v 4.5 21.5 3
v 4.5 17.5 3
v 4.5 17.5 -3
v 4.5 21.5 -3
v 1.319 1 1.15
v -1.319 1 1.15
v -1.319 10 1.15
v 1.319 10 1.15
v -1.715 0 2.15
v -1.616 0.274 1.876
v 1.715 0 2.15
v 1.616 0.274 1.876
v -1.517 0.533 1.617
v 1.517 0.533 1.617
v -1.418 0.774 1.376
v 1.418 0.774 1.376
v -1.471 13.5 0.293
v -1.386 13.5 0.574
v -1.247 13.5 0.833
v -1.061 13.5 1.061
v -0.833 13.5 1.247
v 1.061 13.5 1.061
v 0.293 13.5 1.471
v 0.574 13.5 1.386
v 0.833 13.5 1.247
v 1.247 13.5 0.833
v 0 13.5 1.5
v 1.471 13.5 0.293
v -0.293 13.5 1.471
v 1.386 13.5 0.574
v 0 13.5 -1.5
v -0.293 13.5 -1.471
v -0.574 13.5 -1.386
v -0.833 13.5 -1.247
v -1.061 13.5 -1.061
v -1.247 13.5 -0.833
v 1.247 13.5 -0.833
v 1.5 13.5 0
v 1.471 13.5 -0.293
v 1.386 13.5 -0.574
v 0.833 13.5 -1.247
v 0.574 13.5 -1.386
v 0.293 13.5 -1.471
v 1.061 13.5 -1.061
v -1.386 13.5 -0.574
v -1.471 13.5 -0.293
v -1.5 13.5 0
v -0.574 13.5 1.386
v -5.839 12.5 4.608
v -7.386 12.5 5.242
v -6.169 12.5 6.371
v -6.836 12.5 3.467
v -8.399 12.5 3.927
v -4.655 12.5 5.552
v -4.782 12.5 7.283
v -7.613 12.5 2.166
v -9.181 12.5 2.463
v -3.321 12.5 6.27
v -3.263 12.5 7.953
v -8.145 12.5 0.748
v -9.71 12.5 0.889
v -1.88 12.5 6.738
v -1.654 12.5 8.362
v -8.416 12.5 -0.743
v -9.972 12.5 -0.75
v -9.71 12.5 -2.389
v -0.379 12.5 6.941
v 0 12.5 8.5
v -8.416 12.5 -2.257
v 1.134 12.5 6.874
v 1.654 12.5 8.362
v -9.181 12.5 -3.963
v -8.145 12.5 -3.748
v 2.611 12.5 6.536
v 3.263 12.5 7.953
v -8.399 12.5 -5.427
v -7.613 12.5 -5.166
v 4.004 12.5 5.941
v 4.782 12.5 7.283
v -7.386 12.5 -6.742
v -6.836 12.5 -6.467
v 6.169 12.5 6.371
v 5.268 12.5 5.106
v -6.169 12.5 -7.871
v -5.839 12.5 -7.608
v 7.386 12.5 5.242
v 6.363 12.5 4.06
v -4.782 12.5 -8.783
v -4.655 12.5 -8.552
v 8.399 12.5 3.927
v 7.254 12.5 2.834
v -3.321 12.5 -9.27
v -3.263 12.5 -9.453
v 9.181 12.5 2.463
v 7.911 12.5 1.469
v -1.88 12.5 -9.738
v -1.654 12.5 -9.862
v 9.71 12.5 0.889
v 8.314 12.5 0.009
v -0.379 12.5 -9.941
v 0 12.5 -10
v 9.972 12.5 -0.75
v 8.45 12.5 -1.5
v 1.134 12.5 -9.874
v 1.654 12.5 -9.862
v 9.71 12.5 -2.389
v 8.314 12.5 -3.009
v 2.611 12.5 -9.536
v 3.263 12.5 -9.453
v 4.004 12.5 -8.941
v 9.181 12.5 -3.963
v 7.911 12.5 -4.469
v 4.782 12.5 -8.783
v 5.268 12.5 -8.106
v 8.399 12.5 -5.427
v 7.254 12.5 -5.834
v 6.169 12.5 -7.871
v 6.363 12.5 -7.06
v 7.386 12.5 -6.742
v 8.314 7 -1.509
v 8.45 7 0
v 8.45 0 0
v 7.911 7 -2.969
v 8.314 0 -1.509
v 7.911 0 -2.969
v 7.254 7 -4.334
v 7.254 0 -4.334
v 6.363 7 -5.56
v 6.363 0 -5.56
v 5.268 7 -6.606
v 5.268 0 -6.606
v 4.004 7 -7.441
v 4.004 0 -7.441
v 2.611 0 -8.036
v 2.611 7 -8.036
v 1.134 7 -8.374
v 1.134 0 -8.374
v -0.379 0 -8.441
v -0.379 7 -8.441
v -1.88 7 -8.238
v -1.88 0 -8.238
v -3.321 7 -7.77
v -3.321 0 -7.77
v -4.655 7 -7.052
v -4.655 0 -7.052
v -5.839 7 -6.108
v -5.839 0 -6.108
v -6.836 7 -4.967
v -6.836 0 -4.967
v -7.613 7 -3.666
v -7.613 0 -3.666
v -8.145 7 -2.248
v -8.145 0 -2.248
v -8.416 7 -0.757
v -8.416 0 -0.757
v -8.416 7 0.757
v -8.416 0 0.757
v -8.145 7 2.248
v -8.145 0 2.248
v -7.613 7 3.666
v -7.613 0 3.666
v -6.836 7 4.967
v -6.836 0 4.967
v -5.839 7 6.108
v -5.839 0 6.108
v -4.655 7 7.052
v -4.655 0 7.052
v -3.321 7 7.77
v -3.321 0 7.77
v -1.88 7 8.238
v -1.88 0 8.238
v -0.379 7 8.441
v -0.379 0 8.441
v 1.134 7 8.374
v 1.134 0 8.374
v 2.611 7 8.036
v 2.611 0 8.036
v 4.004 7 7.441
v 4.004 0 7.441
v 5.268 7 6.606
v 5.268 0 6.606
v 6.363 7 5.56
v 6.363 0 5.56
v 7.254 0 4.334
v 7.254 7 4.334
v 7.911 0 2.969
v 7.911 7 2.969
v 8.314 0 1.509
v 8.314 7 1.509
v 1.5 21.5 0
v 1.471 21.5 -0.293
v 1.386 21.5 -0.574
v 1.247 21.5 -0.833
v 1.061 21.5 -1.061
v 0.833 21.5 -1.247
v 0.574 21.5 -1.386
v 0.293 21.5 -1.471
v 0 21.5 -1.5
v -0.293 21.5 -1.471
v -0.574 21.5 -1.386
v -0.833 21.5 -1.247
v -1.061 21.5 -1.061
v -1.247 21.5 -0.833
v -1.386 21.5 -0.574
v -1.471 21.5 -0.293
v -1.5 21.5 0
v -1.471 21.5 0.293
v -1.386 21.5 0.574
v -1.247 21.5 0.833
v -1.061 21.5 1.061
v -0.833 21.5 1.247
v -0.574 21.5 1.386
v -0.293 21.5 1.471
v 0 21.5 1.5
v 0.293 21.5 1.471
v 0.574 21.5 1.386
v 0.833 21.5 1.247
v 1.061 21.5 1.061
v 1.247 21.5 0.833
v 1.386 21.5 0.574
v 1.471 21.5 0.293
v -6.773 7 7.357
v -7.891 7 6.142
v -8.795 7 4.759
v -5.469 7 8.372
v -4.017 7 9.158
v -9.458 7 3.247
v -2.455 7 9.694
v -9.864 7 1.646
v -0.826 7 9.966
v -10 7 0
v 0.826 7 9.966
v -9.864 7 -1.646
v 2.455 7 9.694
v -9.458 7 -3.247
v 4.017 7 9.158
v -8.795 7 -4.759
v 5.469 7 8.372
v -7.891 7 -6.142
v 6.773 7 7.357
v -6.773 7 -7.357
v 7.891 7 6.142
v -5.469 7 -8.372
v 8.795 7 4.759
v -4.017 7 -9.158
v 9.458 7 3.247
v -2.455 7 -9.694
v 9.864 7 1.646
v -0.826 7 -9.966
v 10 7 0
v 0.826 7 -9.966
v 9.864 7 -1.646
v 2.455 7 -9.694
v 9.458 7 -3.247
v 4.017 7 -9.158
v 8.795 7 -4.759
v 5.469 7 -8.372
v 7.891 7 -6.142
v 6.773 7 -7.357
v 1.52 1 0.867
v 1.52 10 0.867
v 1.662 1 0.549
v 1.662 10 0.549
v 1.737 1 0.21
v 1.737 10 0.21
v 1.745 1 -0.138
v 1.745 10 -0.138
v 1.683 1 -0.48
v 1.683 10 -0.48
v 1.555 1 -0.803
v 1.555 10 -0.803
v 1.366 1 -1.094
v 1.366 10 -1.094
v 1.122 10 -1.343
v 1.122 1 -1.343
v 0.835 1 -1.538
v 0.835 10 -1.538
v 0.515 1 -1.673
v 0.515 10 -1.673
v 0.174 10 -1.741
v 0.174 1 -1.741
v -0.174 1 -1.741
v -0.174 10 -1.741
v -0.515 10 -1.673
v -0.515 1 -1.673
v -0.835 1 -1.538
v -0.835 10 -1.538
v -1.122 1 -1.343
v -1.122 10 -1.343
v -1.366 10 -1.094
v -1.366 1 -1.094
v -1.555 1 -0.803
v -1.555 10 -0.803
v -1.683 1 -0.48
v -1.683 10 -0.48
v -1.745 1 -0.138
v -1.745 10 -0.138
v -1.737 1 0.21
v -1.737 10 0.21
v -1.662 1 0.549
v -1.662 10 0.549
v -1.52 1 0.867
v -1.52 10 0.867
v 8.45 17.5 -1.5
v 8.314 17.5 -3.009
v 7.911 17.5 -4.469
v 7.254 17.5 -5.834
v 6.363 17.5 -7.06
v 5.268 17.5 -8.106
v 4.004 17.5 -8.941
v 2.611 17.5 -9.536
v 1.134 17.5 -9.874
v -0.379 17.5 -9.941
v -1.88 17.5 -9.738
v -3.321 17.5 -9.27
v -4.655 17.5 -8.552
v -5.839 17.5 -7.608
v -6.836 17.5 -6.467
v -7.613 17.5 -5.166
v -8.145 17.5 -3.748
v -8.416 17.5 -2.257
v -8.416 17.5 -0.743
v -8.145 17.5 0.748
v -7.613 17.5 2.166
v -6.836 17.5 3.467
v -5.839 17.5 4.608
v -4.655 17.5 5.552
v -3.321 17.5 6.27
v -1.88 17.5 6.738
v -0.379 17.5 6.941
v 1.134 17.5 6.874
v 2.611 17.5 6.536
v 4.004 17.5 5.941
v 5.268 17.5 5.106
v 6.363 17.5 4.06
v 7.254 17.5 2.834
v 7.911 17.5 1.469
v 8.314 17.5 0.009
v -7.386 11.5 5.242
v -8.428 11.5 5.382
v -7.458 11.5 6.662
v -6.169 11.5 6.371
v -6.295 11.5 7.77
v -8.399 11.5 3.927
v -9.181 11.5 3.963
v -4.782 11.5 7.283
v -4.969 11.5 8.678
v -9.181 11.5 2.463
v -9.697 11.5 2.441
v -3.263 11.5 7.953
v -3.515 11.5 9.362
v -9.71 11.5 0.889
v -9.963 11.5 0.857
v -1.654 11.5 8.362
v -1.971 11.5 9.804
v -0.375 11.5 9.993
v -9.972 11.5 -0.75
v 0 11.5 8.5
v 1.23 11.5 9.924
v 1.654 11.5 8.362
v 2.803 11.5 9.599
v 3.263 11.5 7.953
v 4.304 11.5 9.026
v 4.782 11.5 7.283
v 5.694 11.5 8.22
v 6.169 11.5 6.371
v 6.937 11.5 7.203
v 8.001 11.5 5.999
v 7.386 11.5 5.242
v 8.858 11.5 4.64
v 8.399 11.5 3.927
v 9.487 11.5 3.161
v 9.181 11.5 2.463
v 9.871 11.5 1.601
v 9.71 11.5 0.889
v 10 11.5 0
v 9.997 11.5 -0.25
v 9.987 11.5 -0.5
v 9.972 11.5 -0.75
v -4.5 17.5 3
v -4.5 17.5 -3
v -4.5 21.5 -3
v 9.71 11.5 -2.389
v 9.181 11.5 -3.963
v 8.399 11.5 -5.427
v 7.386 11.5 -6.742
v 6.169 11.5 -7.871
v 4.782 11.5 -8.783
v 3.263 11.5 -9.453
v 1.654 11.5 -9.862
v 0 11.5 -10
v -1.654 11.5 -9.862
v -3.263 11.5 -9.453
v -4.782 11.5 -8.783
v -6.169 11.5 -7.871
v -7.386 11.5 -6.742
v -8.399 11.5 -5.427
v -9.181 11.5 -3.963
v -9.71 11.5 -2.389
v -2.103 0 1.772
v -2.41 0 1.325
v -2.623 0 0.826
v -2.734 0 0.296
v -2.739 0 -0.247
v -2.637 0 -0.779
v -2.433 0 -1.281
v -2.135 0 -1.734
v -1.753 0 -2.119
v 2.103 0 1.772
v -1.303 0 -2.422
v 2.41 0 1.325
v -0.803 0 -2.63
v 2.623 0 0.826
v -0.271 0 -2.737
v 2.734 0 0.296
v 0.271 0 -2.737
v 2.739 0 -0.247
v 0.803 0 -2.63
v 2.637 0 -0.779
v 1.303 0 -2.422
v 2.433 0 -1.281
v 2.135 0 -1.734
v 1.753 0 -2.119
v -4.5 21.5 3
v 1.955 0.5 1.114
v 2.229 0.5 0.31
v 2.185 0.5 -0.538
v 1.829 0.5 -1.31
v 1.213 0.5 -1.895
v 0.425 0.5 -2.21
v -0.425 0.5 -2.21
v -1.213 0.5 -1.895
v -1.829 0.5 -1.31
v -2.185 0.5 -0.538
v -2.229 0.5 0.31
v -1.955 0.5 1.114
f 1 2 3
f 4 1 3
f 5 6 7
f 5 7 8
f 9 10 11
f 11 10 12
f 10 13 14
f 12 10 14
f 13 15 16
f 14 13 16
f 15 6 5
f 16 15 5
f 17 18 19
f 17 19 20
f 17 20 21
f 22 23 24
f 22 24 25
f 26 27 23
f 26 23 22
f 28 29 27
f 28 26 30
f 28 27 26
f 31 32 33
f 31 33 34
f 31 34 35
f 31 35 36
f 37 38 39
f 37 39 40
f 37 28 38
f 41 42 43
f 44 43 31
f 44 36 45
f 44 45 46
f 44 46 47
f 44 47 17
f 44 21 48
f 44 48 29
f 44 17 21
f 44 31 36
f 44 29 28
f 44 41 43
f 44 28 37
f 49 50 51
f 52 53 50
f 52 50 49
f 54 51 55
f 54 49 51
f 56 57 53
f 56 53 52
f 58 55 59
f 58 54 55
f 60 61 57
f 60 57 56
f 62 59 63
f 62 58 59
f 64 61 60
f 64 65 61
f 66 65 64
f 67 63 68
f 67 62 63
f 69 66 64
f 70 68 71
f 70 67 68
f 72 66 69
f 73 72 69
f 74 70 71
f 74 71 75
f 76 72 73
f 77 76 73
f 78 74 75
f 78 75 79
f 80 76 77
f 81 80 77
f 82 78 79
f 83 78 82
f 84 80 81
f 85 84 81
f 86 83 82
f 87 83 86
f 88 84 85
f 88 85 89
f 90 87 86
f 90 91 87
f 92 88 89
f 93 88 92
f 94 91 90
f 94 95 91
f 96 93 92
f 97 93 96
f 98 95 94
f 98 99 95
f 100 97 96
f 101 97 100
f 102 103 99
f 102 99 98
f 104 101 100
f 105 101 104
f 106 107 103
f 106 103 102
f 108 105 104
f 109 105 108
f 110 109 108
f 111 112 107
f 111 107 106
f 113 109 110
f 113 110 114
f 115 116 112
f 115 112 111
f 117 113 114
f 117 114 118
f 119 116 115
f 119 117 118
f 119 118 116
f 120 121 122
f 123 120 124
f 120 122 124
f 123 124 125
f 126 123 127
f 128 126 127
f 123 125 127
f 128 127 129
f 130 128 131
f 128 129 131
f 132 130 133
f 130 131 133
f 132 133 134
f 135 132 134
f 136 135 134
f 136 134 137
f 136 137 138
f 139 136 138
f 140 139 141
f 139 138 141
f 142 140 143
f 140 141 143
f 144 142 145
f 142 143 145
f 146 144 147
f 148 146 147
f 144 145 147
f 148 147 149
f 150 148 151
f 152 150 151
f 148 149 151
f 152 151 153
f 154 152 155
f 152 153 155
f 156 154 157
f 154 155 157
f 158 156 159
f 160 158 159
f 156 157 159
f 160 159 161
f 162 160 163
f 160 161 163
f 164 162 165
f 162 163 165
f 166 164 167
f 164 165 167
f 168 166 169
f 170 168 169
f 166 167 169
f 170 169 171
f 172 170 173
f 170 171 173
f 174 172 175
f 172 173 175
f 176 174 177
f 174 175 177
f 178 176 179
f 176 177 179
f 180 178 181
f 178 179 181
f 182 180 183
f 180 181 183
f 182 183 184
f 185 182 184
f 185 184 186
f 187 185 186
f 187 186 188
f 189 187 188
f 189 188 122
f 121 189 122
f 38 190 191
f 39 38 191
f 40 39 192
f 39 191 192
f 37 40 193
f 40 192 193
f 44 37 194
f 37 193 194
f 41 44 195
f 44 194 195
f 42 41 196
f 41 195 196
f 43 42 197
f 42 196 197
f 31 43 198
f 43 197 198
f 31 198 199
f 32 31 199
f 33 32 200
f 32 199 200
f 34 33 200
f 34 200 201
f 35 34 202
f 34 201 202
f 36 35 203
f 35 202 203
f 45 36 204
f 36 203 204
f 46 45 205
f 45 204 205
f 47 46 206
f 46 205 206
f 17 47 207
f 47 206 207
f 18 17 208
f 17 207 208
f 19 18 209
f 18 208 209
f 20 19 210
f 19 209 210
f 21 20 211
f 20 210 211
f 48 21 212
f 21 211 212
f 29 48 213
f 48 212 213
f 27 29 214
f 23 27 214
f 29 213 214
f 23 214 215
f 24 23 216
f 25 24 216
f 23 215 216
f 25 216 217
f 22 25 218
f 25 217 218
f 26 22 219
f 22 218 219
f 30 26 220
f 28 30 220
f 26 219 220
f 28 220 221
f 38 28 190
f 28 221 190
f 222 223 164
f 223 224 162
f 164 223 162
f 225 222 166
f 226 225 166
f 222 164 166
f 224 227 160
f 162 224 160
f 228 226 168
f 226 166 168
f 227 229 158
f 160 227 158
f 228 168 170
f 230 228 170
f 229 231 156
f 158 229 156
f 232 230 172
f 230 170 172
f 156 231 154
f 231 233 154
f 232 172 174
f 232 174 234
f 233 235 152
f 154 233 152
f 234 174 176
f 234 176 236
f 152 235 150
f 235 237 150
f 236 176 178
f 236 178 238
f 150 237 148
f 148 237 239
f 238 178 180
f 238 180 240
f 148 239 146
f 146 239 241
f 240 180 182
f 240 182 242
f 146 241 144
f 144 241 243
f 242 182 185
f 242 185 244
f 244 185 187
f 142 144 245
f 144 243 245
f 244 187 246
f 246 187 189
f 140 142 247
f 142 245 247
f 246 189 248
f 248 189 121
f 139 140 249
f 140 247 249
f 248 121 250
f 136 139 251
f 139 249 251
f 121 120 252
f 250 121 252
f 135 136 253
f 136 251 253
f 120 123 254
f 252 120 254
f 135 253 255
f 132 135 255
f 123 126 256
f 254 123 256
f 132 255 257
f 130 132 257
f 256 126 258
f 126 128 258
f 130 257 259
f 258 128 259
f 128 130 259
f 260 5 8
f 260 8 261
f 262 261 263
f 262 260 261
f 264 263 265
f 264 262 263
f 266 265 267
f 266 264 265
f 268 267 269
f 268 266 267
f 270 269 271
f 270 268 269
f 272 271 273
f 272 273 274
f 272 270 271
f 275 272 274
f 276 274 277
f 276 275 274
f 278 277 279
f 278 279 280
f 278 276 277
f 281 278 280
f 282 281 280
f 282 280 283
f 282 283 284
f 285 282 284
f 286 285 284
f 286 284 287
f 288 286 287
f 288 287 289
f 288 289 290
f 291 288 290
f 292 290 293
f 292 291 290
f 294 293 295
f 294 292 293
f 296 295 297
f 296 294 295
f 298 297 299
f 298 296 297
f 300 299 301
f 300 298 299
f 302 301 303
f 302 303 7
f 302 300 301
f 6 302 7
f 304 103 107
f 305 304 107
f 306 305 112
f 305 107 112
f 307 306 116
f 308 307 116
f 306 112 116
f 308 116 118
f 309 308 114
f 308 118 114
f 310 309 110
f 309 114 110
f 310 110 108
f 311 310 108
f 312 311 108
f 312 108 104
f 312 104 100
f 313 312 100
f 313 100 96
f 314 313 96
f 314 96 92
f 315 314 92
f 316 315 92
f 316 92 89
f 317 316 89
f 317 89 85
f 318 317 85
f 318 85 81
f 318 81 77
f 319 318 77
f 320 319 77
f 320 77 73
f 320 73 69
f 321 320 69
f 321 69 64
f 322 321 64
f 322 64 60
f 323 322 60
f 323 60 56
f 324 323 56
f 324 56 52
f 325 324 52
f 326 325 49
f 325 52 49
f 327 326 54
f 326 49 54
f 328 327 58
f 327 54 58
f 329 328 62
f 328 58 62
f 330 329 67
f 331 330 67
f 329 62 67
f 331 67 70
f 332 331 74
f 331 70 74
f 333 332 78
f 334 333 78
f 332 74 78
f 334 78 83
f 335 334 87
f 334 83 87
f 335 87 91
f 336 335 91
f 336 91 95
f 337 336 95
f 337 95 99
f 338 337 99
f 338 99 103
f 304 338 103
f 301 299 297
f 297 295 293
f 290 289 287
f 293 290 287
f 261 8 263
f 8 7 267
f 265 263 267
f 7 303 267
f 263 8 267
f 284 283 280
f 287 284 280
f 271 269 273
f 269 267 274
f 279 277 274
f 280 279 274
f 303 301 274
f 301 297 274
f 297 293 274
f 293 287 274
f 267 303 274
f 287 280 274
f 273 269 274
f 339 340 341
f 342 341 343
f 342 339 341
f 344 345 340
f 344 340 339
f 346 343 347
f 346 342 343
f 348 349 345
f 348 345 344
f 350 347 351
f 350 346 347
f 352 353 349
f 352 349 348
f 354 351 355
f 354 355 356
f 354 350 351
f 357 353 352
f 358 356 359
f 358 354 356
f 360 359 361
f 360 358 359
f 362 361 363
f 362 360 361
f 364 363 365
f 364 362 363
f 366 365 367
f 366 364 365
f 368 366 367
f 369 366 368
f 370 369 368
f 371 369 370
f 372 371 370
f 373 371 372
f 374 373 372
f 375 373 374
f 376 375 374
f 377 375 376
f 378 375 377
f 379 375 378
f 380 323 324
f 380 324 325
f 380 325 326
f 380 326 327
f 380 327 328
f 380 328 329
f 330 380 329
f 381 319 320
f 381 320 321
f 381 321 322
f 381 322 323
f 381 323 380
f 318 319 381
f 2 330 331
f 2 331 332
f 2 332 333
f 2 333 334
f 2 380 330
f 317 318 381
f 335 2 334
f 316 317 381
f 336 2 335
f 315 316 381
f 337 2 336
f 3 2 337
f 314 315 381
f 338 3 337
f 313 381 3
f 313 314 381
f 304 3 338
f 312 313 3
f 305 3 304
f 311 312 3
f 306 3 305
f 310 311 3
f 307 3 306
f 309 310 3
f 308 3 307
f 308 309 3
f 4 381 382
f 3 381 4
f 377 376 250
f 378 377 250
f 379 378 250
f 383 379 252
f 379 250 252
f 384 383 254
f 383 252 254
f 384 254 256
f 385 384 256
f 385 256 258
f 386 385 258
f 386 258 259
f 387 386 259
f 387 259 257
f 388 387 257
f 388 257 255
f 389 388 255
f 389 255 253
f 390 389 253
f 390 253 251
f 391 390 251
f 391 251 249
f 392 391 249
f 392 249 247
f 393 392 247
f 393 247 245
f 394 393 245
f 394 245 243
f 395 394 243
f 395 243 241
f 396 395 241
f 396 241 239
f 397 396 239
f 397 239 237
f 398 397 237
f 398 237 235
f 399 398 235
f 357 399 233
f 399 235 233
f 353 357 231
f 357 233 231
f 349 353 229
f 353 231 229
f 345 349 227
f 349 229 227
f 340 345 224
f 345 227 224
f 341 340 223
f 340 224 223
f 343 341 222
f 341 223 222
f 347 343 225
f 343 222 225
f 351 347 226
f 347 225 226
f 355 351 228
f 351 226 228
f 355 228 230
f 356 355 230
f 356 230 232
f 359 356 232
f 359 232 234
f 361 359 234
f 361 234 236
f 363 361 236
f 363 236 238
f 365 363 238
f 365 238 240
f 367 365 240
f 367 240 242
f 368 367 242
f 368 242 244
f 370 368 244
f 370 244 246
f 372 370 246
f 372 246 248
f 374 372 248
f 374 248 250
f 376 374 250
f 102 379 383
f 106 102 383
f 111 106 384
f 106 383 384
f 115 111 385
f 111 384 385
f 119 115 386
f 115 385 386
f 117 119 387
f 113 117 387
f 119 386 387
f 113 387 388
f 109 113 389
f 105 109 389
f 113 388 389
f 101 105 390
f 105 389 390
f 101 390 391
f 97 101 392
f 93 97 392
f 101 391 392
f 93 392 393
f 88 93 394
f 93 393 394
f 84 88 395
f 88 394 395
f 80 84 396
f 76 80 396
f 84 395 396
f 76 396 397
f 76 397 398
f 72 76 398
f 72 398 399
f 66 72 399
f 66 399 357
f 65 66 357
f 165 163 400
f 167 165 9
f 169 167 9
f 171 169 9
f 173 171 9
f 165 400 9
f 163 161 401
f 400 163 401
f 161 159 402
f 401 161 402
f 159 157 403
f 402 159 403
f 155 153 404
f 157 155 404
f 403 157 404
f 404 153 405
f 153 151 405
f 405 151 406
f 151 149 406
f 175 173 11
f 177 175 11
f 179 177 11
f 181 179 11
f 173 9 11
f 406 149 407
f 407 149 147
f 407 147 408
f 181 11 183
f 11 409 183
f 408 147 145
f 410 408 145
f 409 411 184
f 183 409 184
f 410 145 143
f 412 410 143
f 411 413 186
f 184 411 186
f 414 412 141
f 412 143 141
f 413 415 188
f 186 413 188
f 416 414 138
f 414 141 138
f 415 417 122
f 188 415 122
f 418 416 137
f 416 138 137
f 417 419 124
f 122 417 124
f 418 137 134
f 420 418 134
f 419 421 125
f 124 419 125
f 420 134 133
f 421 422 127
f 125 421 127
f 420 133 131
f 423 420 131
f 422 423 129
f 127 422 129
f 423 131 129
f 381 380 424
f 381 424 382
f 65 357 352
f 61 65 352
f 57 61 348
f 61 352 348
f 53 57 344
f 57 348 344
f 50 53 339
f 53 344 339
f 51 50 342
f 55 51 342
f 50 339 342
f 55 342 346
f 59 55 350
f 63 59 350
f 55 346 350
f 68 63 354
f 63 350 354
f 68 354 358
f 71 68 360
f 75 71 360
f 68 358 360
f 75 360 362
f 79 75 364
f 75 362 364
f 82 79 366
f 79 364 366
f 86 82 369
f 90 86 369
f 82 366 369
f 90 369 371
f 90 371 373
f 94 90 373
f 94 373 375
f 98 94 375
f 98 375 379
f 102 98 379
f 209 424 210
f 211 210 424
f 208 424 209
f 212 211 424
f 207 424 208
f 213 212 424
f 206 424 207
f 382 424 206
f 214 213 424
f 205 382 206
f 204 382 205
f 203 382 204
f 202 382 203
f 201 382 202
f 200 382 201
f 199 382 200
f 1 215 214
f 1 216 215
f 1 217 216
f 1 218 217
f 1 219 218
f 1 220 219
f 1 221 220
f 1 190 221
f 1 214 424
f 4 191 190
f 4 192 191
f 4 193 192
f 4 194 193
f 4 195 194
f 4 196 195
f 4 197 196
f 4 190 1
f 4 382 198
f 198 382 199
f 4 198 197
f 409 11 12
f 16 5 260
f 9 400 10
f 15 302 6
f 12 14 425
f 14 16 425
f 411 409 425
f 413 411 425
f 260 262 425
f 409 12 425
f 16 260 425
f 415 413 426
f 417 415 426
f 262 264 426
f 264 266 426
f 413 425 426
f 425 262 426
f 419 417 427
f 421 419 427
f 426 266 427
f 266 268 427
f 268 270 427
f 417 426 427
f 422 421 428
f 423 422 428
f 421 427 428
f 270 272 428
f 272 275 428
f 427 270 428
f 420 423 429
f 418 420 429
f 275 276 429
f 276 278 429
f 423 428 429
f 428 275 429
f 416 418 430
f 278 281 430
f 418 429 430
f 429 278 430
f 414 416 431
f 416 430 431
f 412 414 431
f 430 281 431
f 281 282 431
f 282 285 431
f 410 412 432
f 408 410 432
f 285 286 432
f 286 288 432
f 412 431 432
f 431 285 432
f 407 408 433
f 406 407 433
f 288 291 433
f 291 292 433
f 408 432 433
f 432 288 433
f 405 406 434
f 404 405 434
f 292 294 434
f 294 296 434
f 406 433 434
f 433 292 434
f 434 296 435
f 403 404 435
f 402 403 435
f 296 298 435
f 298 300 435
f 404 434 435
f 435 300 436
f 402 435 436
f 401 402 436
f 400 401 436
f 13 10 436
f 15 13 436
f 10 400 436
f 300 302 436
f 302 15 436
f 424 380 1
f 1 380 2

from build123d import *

# Parameters (mm, degrees)
SKETCH1_R           = 8.45
BOSS_EXTRUDE1_DEPTH = 7
SKETCH2_R           = 10
BOSS_EXTRUDE2_DEPTH = 4.5
SKETCH3_R           = 8.45
BOSS_EXTRUDE3_DEPTH = 6
SKETCH4_R           = 8.45
BOSS_EXTRUDE4_DEPTH = 1
SKETCH5_W           = 9
SKETCH5_H           = 6
BOSS_EXTRUDE5_DEPTH = 4
SKETCH6_R           = 1.5
CUT_EXTRUDE1_DEPTH  = 8
CUT_EXTRUDE4_DEPTH  = 10
CHAMFER1_SIZE       = 1


with BuildPart() as part:
    # Sketch1 → Boss-Extrude1 (new body)
    with BuildSketch(Plane(origin=(0, 0, 0), x_dir=(1, 0, 0), z_dir=(0, 1, 0))):
        Circle(SKETCH1_R)
    extrude(amount=BOSS_EXTRUDE1_DEPTH)

    # Sketch2 → Boss-Extrude2 (add)
    with BuildSketch(Plane(origin=(0, 7, 0), x_dir=(1, 0, 0), z_dir=(0, 1, 0))):
        Circle(SKETCH2_R)
    extrude(amount=BOSS_EXTRUDE2_DEPTH)

    # Sketch3 → Boss-Extrude3 (add)
    with BuildSketch(Plane(origin=(0, 11.5, 0), x_dir=(1, 0, 0), z_dir=(0, 1, 0))):
        with Locations((0, 1.5)):
            Circle(SKETCH3_R)
    extrude(amount=BOSS_EXTRUDE3_DEPTH)

    # Sketch4 → Boss-Extrude4 (add)
    with BuildSketch(Plane(origin=(0, 11.5, 0), x_dir=(1, 0, 0), z_dir=(0, 1, 0))):
        with BuildLine():
            ThreePointArc((9.971835338, 0.75), (0, 10), (-9.971835338, 0.75))
            ThreePointArc((-9.971835338, 0.75), (0, -8.5), (9.971835338, 0.75))
        make_face()
        with Locations((0, 1.5)):
            Circle(SKETCH4_R, mode=Mode.SUBTRACT)
    extrude(amount=BOSS_EXTRUDE4_DEPTH)

    # Sketch5 → Boss-Extrude5 (add)
    with BuildSketch(Plane(origin=(0, 17.5, 0), x_dir=(1, 0, 0), z_dir=(0, 1, 0))):
        Rectangle(SKETCH5_W, SKETCH5_H)
    extrude(amount=BOSS_EXTRUDE5_DEPTH)

    # Sketch6 → Cut-Extrude1 (cut)
    with BuildSketch(Plane(origin=(0, 21.5, 0), x_dir=(1, 0, 0), z_dir=(0, 1, 0))):
        Circle(SKETCH6_R)
    extrude(amount=-CUT_EXTRUDE1_DEPTH, mode=Mode.SUBTRACT)

    # Sketch9 → Cut-Extrude4 (cut)
    with BuildSketch(Plane(origin=(0, 0, 0), x_dir=(-1, 0, 0), z_dir=(0, -1, 0))):
        with BuildLine():
            Line((1.319090596, -1.15), (-1.319090596, -1.15))
            ThreePointArc((-1.319090596, -1.15), (0, 1.75), (1.319090596, -1.15))
        make_face()
    extrude(amount=-CUT_EXTRUDE4_DEPTH, mode=Mode.SUBTRACT)

    # Chamfer1
    chamfer1_edges = [part.edges().sort_by_distance(p)[0] for p in [
        (0, 0, -1.75),
        (0, 0, 1.15),
    ]]
    chamfer(chamfer1_edges, length=CHAMFER1_SIZE)


solid = part.part
